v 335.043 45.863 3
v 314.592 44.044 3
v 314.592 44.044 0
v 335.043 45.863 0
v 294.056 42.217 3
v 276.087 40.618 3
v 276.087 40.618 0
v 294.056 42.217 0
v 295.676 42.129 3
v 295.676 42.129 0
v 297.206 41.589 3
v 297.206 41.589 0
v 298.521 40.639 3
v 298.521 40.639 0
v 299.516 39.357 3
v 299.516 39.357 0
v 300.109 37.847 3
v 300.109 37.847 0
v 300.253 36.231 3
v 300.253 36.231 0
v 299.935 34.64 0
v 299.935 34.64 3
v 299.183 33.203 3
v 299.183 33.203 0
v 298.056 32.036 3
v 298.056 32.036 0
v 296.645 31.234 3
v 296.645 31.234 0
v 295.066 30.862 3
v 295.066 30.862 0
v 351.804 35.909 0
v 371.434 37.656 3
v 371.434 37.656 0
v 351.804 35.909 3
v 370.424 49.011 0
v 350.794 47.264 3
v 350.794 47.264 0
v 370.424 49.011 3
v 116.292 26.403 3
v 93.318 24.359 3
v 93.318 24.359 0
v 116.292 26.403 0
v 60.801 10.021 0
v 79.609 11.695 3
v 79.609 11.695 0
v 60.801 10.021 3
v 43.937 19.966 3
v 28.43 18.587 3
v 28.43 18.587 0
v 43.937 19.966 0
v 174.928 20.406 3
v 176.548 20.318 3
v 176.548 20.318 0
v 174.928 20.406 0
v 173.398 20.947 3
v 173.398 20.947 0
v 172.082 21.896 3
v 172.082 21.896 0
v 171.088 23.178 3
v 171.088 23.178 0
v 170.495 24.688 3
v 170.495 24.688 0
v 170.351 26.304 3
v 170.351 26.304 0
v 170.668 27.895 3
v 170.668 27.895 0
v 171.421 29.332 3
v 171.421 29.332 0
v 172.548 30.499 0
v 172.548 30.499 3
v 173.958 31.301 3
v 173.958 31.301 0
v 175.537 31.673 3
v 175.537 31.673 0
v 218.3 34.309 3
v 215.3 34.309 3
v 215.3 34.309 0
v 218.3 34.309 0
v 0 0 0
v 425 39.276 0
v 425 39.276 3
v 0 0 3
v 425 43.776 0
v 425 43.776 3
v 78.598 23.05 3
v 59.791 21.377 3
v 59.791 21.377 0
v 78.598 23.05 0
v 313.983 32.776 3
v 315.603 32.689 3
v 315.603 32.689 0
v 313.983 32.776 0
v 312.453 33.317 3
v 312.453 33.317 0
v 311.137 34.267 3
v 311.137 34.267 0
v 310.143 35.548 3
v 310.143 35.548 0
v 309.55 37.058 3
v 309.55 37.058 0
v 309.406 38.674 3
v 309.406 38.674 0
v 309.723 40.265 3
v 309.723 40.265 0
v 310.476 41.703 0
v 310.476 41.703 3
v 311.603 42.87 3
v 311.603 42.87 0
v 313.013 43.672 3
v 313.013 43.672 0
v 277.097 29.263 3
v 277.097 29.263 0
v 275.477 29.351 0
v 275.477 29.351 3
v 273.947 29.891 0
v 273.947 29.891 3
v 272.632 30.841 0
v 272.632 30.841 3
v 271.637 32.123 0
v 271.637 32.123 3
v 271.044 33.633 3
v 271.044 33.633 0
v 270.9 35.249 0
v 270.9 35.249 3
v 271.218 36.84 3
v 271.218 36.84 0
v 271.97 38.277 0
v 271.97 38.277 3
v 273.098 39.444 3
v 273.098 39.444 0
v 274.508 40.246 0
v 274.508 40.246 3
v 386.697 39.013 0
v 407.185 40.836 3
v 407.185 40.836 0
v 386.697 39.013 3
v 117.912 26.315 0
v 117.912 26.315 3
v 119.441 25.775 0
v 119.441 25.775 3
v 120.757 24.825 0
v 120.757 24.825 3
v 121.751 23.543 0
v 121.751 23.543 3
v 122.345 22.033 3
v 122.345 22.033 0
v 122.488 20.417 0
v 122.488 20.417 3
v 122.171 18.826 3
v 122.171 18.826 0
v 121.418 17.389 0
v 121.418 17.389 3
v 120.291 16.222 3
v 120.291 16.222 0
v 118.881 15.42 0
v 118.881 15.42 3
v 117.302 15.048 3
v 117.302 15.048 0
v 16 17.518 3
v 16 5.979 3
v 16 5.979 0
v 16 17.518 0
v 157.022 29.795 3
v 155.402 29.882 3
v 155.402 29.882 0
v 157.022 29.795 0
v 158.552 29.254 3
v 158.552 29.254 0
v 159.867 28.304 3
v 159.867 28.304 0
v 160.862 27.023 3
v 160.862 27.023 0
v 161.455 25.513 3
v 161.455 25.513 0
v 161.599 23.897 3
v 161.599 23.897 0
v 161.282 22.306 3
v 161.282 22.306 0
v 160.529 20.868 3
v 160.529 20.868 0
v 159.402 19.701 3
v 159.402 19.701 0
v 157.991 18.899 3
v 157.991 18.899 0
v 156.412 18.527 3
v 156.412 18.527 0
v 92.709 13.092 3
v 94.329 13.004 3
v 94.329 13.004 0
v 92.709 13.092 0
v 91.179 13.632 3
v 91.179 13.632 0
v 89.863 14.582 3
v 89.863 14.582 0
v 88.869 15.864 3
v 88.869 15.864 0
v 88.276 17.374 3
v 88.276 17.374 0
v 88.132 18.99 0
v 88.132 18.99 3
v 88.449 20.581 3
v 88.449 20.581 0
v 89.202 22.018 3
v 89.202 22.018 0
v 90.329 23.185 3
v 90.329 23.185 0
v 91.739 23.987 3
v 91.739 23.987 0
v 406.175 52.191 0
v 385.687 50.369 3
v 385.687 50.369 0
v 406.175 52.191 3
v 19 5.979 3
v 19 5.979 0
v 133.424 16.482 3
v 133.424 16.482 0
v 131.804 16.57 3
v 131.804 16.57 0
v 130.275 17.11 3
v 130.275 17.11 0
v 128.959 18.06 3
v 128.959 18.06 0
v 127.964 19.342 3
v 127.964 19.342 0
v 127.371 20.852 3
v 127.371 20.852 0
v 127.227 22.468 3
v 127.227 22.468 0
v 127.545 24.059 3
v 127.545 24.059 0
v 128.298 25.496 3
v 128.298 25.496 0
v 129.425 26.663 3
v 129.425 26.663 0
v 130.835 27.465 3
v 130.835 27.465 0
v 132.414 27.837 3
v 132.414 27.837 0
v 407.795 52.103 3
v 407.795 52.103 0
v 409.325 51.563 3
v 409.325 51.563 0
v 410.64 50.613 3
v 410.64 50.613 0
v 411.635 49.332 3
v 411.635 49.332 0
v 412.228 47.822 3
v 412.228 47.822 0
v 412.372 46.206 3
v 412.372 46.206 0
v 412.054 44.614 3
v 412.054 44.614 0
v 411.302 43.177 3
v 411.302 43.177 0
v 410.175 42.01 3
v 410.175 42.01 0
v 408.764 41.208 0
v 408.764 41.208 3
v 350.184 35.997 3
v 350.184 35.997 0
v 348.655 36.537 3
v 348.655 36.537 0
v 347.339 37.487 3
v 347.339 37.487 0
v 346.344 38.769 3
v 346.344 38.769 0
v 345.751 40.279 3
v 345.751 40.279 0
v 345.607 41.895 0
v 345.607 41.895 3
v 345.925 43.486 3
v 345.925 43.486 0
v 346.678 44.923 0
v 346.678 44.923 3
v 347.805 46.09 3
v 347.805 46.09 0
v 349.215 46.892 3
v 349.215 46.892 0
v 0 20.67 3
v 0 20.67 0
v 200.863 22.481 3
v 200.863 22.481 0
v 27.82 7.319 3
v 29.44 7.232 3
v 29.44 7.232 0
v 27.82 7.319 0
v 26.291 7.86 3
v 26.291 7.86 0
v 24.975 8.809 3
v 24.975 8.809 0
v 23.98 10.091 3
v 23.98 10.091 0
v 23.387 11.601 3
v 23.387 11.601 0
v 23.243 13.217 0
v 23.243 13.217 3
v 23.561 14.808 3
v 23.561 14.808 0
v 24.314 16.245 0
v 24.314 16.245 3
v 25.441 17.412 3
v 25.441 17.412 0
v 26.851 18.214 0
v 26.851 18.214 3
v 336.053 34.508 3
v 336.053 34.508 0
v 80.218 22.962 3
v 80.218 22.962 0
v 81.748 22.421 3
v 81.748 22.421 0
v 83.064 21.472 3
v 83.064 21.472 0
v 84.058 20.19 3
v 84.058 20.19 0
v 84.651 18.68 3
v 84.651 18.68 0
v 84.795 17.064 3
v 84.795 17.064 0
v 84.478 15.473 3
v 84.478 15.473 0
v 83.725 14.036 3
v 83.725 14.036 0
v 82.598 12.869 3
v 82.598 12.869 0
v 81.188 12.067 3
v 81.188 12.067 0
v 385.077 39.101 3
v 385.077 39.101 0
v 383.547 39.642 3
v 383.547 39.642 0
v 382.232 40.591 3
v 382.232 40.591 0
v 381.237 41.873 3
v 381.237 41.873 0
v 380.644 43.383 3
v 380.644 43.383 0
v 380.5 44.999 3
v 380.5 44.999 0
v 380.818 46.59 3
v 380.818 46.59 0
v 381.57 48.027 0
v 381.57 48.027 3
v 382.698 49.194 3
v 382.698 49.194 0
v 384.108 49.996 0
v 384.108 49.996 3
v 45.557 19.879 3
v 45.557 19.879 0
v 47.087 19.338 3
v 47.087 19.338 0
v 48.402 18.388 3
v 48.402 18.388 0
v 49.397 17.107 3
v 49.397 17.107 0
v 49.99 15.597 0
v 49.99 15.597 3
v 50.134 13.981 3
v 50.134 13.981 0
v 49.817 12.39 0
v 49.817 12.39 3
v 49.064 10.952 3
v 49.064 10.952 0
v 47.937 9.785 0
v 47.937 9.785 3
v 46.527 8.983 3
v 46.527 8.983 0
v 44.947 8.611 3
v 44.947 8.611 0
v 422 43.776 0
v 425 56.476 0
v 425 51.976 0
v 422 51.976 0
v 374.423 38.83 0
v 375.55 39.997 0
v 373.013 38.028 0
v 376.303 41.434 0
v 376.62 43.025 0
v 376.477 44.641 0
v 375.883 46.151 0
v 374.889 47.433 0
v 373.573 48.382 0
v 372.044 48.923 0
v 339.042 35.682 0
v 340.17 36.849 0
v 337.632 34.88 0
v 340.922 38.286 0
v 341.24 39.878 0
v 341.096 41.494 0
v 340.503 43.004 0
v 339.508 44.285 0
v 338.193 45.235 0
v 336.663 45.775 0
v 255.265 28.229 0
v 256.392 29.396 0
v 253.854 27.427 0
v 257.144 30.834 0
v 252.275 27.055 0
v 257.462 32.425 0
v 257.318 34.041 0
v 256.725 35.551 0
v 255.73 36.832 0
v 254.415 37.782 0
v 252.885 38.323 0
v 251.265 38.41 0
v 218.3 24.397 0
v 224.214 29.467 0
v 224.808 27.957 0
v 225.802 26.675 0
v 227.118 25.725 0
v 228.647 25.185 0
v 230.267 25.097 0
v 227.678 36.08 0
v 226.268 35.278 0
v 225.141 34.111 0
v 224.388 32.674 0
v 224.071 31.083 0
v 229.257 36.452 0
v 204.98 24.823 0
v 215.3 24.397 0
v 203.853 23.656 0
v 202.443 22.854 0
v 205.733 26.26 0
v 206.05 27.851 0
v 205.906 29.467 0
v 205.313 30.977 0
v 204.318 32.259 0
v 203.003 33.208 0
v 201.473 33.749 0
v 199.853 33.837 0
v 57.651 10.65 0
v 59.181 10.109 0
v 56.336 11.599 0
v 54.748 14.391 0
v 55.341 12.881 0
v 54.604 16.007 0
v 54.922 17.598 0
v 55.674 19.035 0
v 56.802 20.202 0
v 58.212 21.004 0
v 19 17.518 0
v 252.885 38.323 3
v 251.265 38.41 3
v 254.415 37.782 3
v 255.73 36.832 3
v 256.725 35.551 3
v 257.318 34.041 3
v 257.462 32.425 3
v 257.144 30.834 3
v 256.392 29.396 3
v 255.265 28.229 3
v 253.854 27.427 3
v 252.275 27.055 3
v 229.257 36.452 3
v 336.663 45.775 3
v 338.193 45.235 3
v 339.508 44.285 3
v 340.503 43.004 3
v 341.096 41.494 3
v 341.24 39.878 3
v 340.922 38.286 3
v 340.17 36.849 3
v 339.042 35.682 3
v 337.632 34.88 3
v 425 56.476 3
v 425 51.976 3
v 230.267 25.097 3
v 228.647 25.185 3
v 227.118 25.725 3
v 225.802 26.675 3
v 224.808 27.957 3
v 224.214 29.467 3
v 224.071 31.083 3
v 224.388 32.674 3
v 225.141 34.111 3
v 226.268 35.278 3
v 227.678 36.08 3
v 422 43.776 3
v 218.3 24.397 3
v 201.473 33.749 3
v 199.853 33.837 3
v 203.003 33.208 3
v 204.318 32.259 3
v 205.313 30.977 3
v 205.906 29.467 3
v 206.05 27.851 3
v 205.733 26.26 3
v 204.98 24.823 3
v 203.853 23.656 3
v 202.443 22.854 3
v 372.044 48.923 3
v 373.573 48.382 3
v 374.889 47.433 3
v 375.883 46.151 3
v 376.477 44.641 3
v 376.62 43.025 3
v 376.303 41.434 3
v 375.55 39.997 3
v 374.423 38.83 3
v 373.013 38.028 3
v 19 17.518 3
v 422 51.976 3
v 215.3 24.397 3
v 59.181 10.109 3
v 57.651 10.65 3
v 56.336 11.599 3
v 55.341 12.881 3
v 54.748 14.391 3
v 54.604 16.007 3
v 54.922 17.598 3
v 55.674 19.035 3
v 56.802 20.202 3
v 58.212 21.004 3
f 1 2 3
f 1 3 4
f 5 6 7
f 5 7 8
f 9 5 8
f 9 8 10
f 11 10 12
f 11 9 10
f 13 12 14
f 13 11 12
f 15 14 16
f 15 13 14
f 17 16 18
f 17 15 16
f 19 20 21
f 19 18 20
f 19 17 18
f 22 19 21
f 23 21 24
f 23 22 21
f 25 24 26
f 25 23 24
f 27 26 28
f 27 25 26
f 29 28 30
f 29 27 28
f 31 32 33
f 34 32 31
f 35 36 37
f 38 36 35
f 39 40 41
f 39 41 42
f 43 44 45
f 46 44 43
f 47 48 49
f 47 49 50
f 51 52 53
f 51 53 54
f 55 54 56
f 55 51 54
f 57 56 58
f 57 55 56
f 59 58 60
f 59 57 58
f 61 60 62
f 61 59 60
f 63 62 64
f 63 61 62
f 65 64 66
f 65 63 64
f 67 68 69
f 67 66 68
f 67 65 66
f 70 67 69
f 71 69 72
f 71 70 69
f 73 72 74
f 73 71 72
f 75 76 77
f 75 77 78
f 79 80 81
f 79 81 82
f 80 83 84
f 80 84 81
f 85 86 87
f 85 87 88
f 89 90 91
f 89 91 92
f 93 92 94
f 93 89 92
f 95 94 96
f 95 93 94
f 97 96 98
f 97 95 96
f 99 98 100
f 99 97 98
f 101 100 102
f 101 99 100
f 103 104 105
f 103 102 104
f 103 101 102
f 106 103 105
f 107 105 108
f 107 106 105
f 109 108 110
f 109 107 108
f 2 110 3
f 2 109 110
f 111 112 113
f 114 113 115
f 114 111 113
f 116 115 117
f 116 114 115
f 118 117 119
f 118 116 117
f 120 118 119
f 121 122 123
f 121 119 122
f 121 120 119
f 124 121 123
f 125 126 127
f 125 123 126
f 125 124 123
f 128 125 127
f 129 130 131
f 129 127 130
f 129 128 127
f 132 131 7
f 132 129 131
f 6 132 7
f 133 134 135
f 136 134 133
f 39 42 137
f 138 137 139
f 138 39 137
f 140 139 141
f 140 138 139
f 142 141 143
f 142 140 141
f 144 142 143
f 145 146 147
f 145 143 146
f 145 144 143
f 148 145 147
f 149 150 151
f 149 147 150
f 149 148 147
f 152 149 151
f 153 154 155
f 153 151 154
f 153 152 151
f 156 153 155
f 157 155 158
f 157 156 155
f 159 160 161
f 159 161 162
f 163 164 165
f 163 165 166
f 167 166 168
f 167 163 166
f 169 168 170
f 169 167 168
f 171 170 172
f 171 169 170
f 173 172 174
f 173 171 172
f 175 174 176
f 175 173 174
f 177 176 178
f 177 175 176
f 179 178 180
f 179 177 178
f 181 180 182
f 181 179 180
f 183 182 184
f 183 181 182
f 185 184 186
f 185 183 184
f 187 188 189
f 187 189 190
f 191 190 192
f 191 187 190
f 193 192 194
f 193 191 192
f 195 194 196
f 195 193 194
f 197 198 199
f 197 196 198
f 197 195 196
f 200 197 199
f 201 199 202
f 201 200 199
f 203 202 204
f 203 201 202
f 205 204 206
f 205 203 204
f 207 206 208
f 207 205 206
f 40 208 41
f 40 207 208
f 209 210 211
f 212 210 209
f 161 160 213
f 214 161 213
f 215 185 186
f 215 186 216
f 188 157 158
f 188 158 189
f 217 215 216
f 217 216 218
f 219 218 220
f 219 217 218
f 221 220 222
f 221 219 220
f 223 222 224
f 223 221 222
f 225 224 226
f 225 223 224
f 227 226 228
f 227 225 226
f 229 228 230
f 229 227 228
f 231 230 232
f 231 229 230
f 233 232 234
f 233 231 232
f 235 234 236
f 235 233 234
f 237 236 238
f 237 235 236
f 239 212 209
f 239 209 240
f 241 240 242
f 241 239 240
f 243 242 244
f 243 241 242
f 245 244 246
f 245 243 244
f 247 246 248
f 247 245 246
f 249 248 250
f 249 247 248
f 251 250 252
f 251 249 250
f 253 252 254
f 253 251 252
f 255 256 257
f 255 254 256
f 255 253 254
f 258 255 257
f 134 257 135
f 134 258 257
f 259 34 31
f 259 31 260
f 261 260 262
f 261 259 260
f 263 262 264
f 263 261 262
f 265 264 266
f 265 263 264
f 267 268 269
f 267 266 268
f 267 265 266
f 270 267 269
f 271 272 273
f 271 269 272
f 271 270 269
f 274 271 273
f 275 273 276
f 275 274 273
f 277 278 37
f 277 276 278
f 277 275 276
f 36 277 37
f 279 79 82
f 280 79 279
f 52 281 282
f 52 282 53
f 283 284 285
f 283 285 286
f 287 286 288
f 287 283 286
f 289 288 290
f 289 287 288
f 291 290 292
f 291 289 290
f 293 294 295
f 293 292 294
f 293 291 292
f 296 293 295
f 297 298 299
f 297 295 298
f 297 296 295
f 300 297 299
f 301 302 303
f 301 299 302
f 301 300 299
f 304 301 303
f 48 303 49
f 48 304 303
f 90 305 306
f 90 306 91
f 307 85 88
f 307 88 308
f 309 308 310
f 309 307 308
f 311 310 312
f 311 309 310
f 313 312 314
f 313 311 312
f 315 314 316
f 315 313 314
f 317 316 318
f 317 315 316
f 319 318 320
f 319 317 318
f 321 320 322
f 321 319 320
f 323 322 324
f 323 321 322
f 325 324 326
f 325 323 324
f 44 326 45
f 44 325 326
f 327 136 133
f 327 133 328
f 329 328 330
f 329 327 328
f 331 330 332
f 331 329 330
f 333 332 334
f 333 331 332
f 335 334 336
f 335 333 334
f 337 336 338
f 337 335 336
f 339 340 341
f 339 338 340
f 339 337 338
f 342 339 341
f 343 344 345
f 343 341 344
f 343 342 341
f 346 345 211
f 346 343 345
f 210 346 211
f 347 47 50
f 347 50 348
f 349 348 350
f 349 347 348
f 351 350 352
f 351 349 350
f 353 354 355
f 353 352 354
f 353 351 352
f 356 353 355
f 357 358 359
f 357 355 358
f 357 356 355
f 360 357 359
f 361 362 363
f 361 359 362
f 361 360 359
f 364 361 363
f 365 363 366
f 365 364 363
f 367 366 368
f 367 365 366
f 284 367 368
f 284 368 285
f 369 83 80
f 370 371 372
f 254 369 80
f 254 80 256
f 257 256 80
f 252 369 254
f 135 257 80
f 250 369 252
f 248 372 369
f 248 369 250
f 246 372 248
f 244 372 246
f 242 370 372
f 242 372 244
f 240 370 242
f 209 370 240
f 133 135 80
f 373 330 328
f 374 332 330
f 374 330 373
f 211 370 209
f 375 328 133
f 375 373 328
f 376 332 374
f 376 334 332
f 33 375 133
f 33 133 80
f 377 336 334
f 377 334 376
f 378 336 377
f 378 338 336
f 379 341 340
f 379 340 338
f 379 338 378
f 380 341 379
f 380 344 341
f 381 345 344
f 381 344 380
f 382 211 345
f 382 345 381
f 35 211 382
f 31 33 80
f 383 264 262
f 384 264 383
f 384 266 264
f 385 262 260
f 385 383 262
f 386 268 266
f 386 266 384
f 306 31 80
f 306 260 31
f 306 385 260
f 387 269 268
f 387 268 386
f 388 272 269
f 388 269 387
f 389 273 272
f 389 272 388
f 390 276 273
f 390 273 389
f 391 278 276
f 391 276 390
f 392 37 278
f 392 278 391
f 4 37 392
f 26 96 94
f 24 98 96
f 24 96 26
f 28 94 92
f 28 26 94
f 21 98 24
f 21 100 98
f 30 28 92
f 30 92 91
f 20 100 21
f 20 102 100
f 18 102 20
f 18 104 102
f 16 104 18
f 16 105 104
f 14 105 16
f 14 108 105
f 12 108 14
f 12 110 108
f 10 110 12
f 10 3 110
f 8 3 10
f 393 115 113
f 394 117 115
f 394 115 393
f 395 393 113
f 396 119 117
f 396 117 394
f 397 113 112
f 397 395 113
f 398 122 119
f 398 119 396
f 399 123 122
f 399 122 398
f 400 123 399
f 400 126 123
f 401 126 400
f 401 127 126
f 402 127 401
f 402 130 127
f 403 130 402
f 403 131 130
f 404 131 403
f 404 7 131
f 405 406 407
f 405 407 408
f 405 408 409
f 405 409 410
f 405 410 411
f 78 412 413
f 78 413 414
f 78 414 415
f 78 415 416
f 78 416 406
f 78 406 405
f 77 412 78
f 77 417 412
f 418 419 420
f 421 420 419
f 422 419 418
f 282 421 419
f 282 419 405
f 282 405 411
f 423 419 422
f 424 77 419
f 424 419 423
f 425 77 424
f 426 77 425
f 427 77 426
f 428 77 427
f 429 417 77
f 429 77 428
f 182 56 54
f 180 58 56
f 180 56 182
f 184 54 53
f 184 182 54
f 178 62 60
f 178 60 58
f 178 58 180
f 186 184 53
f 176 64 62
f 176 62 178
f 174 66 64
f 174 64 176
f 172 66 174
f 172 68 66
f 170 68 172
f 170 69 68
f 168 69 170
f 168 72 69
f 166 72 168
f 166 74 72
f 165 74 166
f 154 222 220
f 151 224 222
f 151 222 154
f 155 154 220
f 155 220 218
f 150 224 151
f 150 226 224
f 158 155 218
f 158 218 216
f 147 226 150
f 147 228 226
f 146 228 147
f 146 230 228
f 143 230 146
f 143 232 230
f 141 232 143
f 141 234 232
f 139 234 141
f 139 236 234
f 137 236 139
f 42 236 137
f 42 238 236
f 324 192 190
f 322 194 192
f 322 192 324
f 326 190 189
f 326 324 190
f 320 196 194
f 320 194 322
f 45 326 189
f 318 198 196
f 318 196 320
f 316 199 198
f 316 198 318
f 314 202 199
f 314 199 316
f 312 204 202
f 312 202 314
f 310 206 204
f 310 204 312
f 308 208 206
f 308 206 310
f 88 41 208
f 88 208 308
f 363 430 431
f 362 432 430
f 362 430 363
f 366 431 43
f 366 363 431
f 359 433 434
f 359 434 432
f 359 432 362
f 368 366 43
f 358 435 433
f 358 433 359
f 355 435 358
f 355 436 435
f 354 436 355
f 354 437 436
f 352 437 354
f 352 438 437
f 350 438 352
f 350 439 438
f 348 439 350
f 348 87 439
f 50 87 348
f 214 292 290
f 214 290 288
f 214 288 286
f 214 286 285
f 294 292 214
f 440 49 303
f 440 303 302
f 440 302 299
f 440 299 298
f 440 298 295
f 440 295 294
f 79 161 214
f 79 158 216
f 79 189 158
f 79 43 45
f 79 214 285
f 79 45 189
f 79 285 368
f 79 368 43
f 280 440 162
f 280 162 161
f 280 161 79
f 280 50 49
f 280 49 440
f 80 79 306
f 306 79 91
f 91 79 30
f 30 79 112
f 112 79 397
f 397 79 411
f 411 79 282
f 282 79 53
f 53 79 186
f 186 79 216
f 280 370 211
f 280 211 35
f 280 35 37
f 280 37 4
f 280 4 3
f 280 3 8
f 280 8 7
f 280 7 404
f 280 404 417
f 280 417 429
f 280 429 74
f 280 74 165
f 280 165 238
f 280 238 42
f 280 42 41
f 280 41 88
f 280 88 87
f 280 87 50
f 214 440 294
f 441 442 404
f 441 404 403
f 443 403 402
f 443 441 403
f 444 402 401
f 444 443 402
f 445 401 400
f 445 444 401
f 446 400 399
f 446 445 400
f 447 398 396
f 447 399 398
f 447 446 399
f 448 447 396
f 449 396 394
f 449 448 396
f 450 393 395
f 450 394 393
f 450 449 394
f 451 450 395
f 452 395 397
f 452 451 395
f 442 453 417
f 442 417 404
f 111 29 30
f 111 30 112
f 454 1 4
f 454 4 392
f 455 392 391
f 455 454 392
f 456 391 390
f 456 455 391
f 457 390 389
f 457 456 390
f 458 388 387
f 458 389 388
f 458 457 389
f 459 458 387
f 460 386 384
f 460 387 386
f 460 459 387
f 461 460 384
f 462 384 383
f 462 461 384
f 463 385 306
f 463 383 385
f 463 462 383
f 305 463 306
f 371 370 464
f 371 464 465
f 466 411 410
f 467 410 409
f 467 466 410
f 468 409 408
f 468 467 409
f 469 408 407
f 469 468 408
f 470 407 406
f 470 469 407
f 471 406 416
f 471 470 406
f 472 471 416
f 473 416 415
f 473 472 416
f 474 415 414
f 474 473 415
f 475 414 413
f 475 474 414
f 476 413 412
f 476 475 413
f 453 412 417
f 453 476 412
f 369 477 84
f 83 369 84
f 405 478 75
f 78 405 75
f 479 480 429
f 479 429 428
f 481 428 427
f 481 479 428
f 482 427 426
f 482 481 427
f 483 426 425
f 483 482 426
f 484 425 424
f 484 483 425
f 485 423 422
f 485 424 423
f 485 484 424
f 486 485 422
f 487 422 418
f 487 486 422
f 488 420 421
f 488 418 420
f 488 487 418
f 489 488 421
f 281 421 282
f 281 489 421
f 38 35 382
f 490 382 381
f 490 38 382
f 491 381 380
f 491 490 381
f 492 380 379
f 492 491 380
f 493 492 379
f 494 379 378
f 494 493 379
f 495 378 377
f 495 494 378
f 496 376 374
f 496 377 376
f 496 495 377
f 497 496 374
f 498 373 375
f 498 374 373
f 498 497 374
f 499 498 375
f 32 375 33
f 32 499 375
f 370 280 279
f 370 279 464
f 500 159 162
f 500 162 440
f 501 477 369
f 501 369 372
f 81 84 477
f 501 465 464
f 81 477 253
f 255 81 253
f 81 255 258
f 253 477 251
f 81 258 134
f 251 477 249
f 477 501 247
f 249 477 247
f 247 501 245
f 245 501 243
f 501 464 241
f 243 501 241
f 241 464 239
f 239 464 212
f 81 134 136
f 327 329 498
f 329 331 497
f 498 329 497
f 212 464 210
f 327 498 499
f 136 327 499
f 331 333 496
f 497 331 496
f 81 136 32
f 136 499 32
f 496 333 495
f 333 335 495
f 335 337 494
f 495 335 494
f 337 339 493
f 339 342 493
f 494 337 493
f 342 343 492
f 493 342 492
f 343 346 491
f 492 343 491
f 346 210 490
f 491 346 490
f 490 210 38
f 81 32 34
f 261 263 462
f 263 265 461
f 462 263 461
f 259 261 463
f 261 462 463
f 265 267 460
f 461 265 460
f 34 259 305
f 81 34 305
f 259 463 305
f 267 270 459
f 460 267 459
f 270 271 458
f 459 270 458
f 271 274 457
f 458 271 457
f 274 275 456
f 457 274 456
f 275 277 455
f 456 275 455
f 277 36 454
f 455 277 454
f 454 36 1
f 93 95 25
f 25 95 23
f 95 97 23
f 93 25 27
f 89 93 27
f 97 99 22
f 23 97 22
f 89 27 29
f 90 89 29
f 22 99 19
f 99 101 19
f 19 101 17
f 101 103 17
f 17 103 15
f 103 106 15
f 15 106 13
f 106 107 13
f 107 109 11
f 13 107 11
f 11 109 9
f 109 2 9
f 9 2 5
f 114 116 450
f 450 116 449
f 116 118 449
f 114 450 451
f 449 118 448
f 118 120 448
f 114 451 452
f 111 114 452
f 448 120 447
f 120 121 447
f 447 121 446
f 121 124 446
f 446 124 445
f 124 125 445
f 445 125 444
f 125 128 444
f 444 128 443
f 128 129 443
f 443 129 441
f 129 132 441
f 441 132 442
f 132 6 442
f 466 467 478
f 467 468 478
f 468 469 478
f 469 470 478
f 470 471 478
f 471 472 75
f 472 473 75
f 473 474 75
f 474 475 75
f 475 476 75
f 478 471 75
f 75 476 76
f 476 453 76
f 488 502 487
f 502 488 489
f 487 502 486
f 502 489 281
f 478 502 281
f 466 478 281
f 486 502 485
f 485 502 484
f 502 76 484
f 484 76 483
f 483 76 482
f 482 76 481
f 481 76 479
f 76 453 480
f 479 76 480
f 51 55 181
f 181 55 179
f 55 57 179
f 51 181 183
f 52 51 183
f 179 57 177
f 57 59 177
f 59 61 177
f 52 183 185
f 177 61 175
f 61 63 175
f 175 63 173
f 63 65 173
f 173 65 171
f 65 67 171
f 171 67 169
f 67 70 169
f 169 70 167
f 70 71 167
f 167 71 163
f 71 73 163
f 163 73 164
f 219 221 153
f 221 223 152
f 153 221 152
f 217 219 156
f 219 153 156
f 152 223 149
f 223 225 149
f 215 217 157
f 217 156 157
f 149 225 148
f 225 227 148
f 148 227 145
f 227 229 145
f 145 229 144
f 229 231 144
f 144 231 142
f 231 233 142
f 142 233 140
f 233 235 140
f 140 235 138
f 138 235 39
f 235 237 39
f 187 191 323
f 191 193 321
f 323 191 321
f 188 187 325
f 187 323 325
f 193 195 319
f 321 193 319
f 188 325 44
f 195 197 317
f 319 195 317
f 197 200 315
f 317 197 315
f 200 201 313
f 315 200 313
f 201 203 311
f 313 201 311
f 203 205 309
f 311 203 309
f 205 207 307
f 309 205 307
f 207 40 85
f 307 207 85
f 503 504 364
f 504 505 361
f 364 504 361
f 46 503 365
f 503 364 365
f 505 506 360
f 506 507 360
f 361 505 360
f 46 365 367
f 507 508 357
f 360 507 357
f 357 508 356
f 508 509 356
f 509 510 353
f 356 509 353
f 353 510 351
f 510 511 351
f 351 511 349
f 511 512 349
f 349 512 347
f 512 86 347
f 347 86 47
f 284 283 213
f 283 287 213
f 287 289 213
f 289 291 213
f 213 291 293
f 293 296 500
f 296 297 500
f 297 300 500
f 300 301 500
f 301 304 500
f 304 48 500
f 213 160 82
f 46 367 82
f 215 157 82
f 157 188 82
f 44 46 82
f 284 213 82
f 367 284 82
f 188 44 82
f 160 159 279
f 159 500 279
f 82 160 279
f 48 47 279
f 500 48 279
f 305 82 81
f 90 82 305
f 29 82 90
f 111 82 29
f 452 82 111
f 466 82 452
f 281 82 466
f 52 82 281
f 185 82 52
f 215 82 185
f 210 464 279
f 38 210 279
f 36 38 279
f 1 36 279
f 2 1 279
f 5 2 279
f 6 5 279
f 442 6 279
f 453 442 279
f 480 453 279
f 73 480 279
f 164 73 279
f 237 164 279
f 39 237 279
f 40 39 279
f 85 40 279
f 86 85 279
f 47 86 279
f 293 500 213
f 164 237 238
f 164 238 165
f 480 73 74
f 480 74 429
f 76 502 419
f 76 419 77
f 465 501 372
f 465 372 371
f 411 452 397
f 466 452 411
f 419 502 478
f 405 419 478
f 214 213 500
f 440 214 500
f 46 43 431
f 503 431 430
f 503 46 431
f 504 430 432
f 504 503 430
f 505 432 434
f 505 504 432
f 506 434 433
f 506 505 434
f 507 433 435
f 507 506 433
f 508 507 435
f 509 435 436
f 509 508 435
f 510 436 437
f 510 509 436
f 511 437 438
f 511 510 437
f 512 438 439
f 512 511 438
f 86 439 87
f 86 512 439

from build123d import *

# Parameters (mm, degrees)
BOSS_EXTRUDE1_DEPTH = 3
SKETCH2_W           = 3
SKETCH2_H           = 11.539364706
SKETCH2_H_2         = 9.912138823
SKETCH2_H_3         = 8.2
CUT_EXTRUDE1_DEPTH  = 10
CUT_EXTRUDE2_DEPTH  = 76.2


with BuildPart() as part:
    # Sketch1 → Boss-Extrude1 (new body)
    with BuildSketch(Plane.XY):
        Polygon((0, 0), (0, 20.67), (425, 56.476433126), (425, 39.276433126), align=None)
    extrude(amount=BOSS_EXTRUDE1_DEPTH)

    # Sketch2 → Cut-Extrude1 (cut)
    with BuildSketch(Plane.XY.offset(3)):
        with Locations((17.5, 11.748324541)):
            Rectangle(SKETCH2_W, SKETCH2_H)
        with Locations((216.8, 29.353048358)):
            Rectangle(SKETCH2_W, SKETCH2_H_2)
        with Locations((423.5, 47.876433126)):
            Rectangle(SKETCH2_W, SKETCH2_H_3)
    extrude(amount=-CUT_EXTRUDE1_DEPTH, mode=Mode.SUBTRACT)

    # Sketch4 → Cut-Extrude2 (cut)
    with BuildSketch(Plane.XY.offset(3)):
        with BuildLine():
            Line((28.430075945, 18.586671141), (43.937260326, 19.96620177))
            ThreePointArc((43.937260326, 19.96620177), (50.119919943, 14.793705267), (44.94742344, 8.611045651))
            Line((44.94742344, 8.611045651), (29.440239059, 7.231515022))
            ThreePointArc((29.440239059, 7.231515022), (23.257579443, 12.404011524), (28.430075945, 18.586671141))
        make_face()
        with BuildLine():
            Line((59.790881277, 21.376551653), (78.598406673, 23.049683067))
            ThreePointArc((78.598406673, 23.049683067), (84.78106629, 17.877186565), (79.608569787, 11.694526949))
            Line((79.608569787, 11.694526949), (60.801044391, 10.021395534))
            ThreePointArc((60.801044391, 10.021395534), (54.618384775, 15.193892037), (59.790881277, 21.376551653))
        make_face()
        with BuildLine():
            Line((229.2571326, 36.452395115), (251.2649972, 38.41023108))
            ThreePointArc((251.2649972, 38.41023108), (257.447656816, 33.237734577), (252.275160313, 27.055074961))
            Line((252.275160313, 27.055074961), (230.267295713, 25.097238996))
            ThreePointArc((230.267295713, 25.097238996), (224.084636097, 30.269735499), (229.2571326, 36.452395115))
        make_face()
        with BuildLine():
            Line((93.318457851, 24.359189743), (116.291702582, 26.40290664))
            ThreePointArc((116.291702582, 26.40290664), (122.474362199, 21.230410138), (117.301865696, 15.047750521))
            Line((117.301865696, 15.047750521), (94.328620964, 13.004033624))
            ThreePointArc((94.328620964, 13.004033624), (88.145961348, 18.176530126), (93.318457851, 24.359189743))
        make_face()
        with BuildLine():
            Line((132.414057624, 27.837163307), (155.402232027, 29.88220836))
            ThreePointArc((155.402232027, 29.88220836), (161.584891644, 24.709711857), (156.412395141, 18.527052241))
            Line((156.412395141, 18.527052241), (133.424220738, 16.482007189))
            ThreePointArc((133.424220738, 16.482007189), (127.241561121, 21.654503691), (132.414057624, 27.837163307))
        make_face()
        with BuildLine():
            Line((175.537412929, 31.673448993), (199.853242838, 33.836603264))
            ThreePointArc((199.853242838, 33.836603264), (206.035902455, 28.664106762), (200.863405952, 22.481447145))
            Line((200.863405952, 22.481447145), (176.547576043, 20.318292874))
            ThreePointArc((176.547576043, 20.318292874), (170.364916427, 25.490789377), (175.537412929, 31.673448993))
        make_face()
        with BuildLine():
            Line((276.086850874, 40.618401601), (294.056080345, 42.216957588))
            ThreePointArc((294.056080345, 42.216957588), (300.238739961, 37.044461085), (295.066243459, 30.861801469))
            Line((295.066243459, 30.861801469), (277.097013988, 29.263245482))
            ThreePointArc((277.097013988, 29.263245482), (270.914354371, 34.435741984), (276.086850874, 40.618401601))
        make_face()
        with BuildLine():
            Line((314.592454226, 44.043888646), (335.042833198, 45.863169534))
            ThreePointArc((335.042833198, 45.863169534), (341.225492815, 40.690673031), (336.052996312, 34.508013415))
            Line((336.052996312, 34.508013415), (315.60261734, 32.688732527))
            ThreePointArc((315.60261734, 32.688732527), (309.419957724, 37.86122903), (314.592454226, 44.043888646))
        make_face()
        with BuildLine():
            Line((350.794077228, 47.26441189), (370.423562276, 49.010665445))
            ThreePointArc((370.423562276, 49.010665445), (376.606221893, 43.838168943), (371.43372539, 37.655509326))
            Line((371.43372539, 37.655509326), (351.804240342, 35.909255771))
            ThreePointArc((351.804240342, 35.909255771), (345.621580725, 41.081752274), (350.794077228, 47.26441189))
        make_face()
        with BuildLine():
            Line((385.686896011, 50.36850294), (406.175047046, 52.191144058))
            ThreePointArc((406.175047046, 52.191144058), (412.357706662, 47.018647556), (407.18521016, 40.835987939))
            Line((407.18521016, 40.835987939), (386.697059125, 39.013346821))
            ThreePointArc((386.697059125, 39.013346821), (380.514399509, 44.185843323), (385.686896011, 50.36850294))
        make_face()
    extrude(amount=-CUT_EXTRUDE2_DEPTH, mode=Mode.SUBTRACT)


solid = part.part
